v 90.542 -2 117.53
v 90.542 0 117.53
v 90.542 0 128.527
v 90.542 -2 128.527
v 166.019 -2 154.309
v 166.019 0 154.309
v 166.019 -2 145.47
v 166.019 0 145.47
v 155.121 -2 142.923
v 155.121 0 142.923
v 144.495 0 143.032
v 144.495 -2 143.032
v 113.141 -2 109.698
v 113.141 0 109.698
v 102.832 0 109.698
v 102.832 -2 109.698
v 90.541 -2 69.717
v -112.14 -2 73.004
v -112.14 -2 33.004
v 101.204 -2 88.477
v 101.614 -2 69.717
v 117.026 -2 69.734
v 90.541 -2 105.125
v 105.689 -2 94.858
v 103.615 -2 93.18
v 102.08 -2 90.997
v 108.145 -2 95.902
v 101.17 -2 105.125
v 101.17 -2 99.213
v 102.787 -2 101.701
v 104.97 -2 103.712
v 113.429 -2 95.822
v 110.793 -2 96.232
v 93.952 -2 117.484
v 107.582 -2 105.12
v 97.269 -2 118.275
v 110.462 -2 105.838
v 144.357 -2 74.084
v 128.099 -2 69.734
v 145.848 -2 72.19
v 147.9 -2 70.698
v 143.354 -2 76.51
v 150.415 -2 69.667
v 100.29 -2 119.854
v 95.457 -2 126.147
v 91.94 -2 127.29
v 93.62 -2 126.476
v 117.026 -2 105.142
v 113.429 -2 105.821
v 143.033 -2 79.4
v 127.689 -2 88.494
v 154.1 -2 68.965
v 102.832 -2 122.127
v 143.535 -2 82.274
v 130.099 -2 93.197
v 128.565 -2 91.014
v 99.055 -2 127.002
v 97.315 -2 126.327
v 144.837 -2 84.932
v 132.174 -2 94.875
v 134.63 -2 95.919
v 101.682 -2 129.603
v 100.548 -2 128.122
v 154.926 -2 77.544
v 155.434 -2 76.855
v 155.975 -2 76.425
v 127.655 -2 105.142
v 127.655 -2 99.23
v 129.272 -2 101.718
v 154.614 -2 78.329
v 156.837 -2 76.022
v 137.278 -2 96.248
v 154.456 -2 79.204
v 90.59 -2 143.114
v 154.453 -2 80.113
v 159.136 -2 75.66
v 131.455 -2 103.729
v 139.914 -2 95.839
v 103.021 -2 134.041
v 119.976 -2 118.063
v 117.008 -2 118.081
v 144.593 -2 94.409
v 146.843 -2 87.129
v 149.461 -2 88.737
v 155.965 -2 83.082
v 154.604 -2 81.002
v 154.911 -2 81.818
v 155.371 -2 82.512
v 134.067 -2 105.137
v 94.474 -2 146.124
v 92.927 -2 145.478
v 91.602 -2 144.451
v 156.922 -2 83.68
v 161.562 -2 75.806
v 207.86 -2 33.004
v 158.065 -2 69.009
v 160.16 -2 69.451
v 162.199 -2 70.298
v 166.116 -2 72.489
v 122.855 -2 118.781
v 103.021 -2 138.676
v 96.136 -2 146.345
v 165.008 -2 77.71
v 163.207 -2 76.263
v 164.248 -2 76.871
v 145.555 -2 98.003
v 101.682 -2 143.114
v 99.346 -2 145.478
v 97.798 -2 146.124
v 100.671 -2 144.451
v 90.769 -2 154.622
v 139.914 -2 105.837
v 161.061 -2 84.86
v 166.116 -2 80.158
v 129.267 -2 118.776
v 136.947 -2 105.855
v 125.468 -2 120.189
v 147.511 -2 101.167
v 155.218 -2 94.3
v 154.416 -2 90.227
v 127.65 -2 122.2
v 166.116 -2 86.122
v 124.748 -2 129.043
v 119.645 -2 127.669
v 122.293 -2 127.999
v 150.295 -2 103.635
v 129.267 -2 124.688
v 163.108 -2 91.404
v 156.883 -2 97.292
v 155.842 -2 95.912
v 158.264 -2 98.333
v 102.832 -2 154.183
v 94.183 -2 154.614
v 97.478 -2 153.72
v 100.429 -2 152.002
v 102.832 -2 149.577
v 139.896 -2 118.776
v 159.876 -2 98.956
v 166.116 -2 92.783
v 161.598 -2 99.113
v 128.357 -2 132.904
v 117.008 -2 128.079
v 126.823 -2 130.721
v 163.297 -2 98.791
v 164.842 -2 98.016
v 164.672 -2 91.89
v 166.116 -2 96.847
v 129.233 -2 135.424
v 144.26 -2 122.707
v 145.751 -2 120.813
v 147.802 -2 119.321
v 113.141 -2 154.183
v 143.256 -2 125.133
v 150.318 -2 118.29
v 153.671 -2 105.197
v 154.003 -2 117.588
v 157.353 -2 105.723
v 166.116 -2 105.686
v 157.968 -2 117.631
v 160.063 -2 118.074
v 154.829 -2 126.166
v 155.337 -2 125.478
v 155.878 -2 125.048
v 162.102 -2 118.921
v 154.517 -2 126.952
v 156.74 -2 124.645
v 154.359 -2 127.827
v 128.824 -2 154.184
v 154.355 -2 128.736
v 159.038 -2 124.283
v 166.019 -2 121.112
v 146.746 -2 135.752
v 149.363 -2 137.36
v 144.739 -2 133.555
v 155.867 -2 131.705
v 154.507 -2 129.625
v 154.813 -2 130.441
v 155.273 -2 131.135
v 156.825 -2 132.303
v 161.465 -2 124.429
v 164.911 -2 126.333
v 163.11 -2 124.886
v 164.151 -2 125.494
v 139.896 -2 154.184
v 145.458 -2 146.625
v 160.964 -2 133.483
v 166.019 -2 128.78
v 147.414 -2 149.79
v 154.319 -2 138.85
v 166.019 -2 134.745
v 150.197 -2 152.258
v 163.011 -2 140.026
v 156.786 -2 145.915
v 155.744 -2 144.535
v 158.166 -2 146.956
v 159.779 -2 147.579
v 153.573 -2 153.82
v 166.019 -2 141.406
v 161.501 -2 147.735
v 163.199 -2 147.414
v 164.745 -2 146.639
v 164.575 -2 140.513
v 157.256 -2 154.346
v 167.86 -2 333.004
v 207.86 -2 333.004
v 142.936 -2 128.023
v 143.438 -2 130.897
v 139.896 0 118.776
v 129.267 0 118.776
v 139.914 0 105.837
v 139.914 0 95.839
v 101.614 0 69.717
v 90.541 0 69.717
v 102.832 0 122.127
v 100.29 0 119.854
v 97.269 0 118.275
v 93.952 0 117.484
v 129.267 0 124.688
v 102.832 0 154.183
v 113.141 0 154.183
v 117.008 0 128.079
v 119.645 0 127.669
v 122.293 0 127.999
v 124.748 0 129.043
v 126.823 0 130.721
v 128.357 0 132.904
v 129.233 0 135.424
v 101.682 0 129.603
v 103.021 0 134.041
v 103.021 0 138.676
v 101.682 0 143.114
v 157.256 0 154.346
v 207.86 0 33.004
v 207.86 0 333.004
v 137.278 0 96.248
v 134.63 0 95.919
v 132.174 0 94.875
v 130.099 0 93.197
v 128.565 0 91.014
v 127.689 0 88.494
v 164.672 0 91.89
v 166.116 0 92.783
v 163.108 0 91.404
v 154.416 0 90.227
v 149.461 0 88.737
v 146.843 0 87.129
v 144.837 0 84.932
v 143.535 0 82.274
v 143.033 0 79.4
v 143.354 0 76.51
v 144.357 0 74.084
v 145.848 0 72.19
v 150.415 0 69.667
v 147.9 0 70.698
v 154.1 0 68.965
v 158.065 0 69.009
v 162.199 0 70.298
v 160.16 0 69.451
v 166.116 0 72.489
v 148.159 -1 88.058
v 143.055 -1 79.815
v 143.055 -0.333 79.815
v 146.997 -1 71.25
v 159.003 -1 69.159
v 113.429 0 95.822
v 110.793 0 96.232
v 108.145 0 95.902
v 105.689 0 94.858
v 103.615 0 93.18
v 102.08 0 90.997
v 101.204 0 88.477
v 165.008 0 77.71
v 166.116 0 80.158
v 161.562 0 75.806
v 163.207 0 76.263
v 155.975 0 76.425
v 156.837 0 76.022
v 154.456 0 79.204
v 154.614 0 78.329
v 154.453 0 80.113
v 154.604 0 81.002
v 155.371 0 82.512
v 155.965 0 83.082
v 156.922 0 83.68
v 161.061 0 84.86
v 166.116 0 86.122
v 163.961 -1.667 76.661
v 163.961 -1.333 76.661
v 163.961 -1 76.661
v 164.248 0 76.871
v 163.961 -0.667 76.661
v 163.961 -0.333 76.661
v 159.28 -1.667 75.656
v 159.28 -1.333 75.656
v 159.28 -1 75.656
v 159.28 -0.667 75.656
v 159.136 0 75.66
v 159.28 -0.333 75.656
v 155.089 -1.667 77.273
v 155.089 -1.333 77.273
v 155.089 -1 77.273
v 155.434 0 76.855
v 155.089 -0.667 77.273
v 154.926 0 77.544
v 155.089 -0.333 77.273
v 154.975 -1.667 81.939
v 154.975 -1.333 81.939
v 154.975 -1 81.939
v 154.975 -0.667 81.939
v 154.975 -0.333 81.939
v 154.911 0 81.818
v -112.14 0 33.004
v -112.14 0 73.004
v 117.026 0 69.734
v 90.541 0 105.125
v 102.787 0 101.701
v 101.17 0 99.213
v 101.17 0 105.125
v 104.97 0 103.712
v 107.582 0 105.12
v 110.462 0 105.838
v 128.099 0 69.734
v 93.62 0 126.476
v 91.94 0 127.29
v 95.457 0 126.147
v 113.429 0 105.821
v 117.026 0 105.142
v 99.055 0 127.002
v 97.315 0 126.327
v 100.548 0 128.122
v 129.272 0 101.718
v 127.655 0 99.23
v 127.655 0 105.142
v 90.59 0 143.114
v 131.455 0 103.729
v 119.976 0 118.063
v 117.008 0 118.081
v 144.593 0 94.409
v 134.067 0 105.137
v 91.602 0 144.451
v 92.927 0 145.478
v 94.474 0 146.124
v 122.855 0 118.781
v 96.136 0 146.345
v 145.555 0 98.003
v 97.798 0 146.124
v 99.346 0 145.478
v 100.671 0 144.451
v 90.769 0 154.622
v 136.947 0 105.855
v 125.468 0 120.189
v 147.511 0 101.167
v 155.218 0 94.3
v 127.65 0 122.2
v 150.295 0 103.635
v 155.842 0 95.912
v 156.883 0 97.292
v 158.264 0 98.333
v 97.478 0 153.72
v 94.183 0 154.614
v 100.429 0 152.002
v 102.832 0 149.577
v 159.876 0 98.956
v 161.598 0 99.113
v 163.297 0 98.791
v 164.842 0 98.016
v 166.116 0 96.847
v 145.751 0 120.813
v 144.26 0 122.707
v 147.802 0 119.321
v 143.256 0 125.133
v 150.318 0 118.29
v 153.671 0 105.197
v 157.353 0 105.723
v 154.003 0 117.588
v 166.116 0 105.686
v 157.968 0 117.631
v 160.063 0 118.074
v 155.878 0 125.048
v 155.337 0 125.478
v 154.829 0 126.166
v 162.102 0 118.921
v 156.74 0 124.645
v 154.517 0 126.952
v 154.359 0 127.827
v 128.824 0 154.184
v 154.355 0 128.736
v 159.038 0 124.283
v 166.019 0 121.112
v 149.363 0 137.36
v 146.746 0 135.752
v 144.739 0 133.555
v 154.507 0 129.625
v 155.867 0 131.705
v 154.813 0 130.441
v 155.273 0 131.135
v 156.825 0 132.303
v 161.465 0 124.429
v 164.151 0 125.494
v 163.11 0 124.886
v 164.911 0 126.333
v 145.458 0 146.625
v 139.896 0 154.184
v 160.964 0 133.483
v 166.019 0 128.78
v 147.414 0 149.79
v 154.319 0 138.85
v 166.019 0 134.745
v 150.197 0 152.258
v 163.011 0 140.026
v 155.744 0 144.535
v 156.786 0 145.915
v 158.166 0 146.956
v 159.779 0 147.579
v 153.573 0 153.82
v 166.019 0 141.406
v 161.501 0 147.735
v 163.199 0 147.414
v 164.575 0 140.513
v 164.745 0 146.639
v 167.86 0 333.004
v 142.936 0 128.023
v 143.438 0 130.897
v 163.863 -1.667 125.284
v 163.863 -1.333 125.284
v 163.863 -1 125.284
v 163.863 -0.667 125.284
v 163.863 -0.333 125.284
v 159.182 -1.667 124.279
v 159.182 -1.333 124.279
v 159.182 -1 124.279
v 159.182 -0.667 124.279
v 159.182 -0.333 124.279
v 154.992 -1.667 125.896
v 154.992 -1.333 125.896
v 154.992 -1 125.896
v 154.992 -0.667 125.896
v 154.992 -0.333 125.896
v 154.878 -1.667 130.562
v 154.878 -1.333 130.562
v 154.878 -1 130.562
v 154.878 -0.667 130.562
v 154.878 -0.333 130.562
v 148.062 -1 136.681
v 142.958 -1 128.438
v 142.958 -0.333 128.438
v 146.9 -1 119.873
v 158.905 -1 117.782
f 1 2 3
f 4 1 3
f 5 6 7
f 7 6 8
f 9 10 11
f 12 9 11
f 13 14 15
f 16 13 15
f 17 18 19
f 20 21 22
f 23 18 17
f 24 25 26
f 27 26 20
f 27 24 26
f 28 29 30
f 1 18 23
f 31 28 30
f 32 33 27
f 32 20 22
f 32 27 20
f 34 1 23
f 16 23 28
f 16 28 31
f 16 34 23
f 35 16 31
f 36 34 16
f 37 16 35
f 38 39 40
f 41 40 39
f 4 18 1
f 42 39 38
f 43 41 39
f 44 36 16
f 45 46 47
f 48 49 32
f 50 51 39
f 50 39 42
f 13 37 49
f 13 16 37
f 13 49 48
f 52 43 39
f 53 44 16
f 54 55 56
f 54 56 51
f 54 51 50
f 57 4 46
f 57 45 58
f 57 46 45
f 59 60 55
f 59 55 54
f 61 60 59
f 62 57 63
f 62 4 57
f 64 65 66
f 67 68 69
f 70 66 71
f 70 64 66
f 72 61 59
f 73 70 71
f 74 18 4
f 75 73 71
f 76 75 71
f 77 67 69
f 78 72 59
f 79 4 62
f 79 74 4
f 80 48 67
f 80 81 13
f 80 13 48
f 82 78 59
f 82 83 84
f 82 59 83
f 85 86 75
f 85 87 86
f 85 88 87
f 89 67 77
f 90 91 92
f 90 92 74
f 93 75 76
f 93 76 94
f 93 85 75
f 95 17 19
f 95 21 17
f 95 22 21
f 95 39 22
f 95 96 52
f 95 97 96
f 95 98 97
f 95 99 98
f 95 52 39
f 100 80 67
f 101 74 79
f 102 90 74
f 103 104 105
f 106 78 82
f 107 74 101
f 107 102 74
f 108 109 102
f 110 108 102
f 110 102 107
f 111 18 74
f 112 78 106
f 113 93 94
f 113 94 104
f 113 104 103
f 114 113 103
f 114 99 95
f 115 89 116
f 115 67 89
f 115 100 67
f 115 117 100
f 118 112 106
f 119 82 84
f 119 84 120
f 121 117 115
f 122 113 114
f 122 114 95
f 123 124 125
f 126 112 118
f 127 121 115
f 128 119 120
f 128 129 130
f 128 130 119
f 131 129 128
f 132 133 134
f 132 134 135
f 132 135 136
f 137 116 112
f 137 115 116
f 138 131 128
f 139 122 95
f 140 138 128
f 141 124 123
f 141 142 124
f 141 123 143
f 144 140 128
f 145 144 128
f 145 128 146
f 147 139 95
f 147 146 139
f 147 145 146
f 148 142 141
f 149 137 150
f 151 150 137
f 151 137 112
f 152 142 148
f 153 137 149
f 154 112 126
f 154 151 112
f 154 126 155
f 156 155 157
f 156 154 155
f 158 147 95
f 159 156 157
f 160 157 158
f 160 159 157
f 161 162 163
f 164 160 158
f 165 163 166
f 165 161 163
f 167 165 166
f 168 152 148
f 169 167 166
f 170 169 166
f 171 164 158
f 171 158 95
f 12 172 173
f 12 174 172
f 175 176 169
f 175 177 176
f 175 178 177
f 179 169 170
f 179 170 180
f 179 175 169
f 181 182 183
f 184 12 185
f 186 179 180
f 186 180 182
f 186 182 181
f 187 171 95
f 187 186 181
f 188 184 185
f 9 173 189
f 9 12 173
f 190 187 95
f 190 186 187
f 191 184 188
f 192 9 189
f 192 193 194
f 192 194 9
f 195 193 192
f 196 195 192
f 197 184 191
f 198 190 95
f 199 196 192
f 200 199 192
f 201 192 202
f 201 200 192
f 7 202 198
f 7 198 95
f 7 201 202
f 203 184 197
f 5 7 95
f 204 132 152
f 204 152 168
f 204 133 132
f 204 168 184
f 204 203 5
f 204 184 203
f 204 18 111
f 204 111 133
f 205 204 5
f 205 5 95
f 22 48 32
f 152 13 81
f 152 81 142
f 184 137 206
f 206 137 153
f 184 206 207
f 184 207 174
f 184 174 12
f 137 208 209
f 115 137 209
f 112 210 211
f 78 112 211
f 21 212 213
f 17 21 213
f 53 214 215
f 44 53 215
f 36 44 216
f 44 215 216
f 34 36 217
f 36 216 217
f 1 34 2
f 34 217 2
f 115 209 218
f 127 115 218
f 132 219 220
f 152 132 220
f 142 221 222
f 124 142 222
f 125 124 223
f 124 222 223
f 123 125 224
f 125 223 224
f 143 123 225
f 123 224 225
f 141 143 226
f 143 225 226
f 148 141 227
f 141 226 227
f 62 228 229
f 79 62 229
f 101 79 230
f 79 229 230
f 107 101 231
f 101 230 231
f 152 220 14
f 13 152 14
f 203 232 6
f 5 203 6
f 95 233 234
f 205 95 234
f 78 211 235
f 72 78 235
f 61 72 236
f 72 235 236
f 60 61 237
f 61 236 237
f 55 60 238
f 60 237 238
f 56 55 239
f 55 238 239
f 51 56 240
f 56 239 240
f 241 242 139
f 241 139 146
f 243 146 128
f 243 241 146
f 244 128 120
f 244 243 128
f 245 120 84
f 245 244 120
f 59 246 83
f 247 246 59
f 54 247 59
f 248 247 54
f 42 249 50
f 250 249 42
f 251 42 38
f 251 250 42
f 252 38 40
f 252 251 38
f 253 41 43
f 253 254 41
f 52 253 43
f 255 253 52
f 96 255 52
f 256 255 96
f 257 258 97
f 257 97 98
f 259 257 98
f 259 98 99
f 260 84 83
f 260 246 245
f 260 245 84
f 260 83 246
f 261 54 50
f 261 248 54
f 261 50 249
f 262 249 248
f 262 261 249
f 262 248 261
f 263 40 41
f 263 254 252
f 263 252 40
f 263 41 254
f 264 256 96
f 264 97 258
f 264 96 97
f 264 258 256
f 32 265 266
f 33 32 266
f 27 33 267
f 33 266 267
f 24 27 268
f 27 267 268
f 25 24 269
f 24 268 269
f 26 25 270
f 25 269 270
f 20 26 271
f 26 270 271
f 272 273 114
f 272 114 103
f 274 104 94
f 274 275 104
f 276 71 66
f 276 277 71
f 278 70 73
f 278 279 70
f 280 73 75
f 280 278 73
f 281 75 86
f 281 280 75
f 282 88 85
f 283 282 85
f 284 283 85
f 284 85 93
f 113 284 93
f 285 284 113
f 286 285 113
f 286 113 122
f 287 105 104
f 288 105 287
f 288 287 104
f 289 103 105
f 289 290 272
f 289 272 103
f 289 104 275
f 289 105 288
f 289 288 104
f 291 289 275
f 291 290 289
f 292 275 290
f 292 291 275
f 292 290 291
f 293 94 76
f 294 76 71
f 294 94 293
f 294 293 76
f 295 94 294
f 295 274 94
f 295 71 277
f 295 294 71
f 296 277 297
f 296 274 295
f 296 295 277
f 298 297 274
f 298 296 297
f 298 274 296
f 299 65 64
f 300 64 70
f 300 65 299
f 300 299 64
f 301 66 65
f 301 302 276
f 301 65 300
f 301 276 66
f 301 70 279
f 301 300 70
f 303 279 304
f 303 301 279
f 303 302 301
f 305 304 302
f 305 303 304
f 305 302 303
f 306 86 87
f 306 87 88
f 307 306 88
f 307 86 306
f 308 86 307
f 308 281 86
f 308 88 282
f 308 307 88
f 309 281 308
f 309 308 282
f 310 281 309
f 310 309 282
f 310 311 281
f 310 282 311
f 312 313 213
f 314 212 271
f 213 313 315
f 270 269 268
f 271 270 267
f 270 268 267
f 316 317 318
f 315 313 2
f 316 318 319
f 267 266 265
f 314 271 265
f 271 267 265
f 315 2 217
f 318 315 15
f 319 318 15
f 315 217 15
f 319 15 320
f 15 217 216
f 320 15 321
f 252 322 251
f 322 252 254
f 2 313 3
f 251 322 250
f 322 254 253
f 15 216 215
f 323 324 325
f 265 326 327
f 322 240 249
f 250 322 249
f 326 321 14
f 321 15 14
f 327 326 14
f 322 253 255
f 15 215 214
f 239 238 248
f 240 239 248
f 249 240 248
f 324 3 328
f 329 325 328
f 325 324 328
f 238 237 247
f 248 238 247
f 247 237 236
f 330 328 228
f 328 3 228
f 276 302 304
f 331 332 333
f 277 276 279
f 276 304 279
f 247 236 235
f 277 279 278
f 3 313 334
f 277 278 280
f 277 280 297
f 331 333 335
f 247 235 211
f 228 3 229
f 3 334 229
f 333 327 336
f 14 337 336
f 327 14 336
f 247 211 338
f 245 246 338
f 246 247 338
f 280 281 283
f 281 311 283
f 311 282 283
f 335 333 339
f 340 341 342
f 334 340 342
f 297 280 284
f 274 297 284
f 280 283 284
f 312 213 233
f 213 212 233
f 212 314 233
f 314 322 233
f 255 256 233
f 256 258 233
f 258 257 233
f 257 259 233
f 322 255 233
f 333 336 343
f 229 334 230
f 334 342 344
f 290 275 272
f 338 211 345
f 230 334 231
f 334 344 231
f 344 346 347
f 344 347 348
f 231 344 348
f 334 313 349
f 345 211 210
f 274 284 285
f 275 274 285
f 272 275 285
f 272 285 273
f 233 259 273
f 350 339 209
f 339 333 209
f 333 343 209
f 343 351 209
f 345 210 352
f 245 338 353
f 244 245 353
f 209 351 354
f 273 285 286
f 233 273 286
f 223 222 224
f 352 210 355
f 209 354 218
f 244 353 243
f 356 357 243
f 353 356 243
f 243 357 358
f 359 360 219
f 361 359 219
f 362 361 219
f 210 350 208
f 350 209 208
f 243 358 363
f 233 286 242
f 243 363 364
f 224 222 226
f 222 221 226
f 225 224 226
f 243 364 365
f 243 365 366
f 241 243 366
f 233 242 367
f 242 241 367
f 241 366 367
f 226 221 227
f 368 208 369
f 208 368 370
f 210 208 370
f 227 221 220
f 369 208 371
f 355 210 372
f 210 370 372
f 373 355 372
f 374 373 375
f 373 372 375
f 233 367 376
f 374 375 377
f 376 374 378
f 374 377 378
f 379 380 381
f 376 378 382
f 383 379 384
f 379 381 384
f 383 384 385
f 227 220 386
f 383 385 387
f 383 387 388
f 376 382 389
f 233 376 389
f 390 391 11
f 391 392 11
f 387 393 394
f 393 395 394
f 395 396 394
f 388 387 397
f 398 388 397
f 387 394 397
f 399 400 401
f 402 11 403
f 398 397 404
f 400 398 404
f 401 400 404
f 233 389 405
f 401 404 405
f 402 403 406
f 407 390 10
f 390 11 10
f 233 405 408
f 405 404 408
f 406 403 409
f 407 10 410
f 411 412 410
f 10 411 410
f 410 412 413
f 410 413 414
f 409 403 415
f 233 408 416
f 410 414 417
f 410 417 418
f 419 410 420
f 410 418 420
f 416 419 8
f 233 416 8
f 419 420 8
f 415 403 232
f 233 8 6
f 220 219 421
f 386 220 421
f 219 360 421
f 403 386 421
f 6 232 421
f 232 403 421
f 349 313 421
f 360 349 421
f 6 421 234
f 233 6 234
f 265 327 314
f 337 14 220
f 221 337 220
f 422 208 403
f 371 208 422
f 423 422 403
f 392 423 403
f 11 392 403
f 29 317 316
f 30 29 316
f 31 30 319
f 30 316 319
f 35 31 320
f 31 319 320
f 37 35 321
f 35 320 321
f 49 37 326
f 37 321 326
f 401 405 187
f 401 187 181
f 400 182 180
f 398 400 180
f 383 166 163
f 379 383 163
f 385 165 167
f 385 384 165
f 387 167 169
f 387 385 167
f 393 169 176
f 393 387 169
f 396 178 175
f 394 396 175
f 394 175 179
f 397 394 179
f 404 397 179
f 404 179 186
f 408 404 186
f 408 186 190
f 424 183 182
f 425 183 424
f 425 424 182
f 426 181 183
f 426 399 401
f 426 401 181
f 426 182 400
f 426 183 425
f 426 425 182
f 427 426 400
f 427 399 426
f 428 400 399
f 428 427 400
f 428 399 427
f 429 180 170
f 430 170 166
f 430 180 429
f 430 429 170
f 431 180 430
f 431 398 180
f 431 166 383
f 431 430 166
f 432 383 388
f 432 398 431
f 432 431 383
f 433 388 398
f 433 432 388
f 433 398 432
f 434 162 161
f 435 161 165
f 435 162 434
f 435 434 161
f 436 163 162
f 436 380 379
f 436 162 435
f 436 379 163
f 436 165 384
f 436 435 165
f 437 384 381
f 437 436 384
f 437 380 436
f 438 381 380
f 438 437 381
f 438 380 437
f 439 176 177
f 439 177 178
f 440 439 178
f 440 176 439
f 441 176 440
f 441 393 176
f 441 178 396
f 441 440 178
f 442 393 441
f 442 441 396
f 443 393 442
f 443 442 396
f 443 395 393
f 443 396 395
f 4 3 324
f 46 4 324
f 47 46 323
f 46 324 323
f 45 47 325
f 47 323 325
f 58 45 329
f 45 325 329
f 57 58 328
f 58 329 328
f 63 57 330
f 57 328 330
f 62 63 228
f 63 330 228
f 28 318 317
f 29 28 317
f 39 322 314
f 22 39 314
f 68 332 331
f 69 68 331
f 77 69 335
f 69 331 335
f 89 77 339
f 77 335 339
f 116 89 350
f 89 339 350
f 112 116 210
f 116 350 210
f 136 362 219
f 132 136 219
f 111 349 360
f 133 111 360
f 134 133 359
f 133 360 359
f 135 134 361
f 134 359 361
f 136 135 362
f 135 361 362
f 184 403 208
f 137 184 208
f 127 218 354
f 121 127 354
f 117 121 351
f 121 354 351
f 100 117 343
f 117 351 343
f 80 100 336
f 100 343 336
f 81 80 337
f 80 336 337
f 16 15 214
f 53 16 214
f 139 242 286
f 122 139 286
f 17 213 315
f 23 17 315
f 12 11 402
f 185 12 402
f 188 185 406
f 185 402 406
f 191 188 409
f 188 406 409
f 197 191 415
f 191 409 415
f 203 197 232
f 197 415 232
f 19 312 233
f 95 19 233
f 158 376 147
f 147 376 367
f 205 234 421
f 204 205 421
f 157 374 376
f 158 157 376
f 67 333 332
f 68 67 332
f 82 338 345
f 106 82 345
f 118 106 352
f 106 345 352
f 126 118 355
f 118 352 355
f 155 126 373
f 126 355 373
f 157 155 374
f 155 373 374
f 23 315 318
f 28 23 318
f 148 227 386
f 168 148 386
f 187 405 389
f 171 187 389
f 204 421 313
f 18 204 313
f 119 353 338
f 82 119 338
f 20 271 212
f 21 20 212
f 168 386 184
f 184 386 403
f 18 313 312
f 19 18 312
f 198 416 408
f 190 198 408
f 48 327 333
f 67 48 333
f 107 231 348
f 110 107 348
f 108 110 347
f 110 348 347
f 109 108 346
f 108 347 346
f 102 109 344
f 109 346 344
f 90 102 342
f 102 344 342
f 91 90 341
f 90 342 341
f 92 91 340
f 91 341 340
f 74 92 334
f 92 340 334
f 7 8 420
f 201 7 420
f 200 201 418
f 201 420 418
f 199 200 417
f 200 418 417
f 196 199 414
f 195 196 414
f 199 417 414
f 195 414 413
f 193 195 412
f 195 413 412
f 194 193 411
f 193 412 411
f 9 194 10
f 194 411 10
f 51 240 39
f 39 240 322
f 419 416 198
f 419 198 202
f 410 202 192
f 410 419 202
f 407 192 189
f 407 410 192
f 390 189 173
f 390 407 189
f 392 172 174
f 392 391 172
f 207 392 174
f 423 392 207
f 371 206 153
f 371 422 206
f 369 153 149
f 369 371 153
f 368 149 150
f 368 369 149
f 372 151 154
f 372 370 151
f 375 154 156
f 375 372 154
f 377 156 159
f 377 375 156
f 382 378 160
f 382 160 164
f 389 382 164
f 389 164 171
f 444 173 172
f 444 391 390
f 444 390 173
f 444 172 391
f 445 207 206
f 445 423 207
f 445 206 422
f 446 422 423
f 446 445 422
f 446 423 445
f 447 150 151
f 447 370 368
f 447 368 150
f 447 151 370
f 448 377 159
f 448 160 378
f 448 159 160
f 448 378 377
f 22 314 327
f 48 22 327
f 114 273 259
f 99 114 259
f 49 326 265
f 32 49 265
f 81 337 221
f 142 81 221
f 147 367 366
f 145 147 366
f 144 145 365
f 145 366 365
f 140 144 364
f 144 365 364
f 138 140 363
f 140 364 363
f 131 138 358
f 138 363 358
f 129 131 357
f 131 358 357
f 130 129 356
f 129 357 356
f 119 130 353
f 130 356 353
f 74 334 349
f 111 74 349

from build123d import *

# Parameters (mm, degrees)
F1_DEPTH = 2


with BuildPart() as f1:
    # F0 (on Front) → F1 (new body)
    with BuildSketch(Plane.XZ):
        Polygon((-112.1402904391, 33.0038927495), (207.8597095609, 33.0038927495), (207.8597095609, 332.3038927495), (207.8597095609, 333.0038927495), (167.8597095609, 333.0038927495), (-112.1402904391, 73.0038927495), align=None)
        with BuildLine():
            Line((101.2039725726, 88.4770882584), (101.6136759777, 69.7171021446))
            Line((101.6136759777, 69.7171021446), (90.5410552282, 69.7171021446))
            Line((90.5410552282, 69.7171021446), (90.5410552282, 105.1249880537))
            Line((90.5410552282, 105.1249880537), (101.1704111356, 105.1249880537))
            Line((101.1704111356, 105.1249880537), (101.1704111356, 99.2129225477))
            ThreePointArc((101.1704111356, 99.2129225477), (106.2318508757, 104.4981198242), (113.4292611737, 105.8205295548))
            Line((113.4292611737, 105.8205295548), (113.4292611737, 95.8221633181))
            ThreePointArc((113.4292611737, 95.8221633181), (105.6893165245, 94.8581367621), (101.2039725726, 88.4770882584))
        make_face(mode=Mode.SUBTRACT)
        with BuildLine():
            Line((127.6888195951, 88.4937142061), (128.0985230001, 69.7337280923))
            Line((128.0985230001, 69.7337280923), (117.0259022507, 69.7337280923))
            Line((117.0259022507, 69.7337280923), (117.0259022507, 105.1416140014))
            Line((117.0259022507, 105.1416140014), (127.6552581581, 105.1416140014))
            Line((127.6552581581, 105.1416140014), (127.6552581581, 99.2295484954))
            ThreePointArc((127.6552581581, 99.2295484954), (132.7166978981, 104.5147457719), (139.9141081962, 105.8371555025))
            Line((139.9141081962, 105.8371555025), (139.9141081962, 95.8387892658))
            ThreePointArc((139.9141081962, 95.8387892658), (132.1741635469, 94.8747627098), (127.6888195951, 88.4937142061))
        make_face(mode=Mode.SUBTRACT)
        with BuildLine():
            add(Edge.make_bspline(
                [(166.1158787618, 92.7830700848), (164.5692102089, 91.5353198263), (160.8559417387, 91.0074140824), (147.0308134747, 89.8356227603), (141.5287422164, 79.8600298922), (145.6215095019, 69.4638702682), (159.8163332075, 68.0542730887), (163.3323899676, 71.0322612124), (166.1158787618, 72.4894021723)],
                knots=[0, 0, 0, 0, 0.1282549597, 0.3235779421, 0.4933166916, 0.6588260023, 0.8480719548, 1, 1, 1, 1], degree=3))
            Line((166.1158787618, 92.7830700848), (166.1158787618, 86.1217890952))
            add(Edge.make_bspline(
                [(166.1158787618, 80.1576142285), (165.648079511, 78.8716732666), (164.7089985438, 76.1838402752), (159.2900957109, 75.3320101397), (154.3144147308, 76.3842047893), (154.1488989038, 82.6667071186), (159.3286899056, 84.8140545113), (163.2298071329, 85.1164060676), (166.1158787618, 86.1217890952)],
                knots=[0, 0, 0, 0, 0.1467139352, 0.3148344078, 0.4723324727, 0.6349882053, 0.7976765175, 1, 1, 1, 1], degree=3))
            Line((166.1158787618, 80.1576142285), (166.1158787618, 72.4894021723))
        make_face(mode=Mode.SUBTRACT)
        with BuildLine():
            ThreePointArc((144.5925937182, 94.4093083117), (148.8127137387, 102.502604489), (157.3532582577, 105.7228459891))
            Line((157.3532582577, 105.7228459891), (166.1158787618, 105.6858685351))
            Line((166.1158787618, 105.6858685351), (166.1158787618, 96.8470781765))
            ThreePointArc((166.1158787618, 96.8470781765), (159.8763121864, 98.9559091904), (155.2180157191, 94.2997698758))
            Line((155.2180157191, 94.2997698758), (144.5925937182, 94.4093083117))
        make_face(mode=Mode.SUBTRACT)
        with BuildLine():
            ThreePointArc((90.7690819051, 154.6215500374), (97.4783010599, 153.7198410632), (102.8321381356, 149.5770003338))
            Line((102.8321381356, 149.5770003338), (102.8321381356, 154.1828896542))
            Line((102.8321381356, 154.1828896542), (113.140575185, 154.1828896542))
            Line((113.140575185, 154.1828896542), (113.140575185, 109.6980508108))
            Line((113.140575185, 109.6980508108), (102.8321381356, 109.6980508108))
            Line((102.8321381356, 109.6980508108), (102.8321381356, 122.1266548772))
            ThreePointArc((102.8321381356, 122.1266548772), (97.2685141585, 118.2745070428), (90.5424948479, 117.5304513116))
            Line((90.5424948479, 117.5304513116), (90.5424948479, 128.526845171))
            ThreePointArc((90.5424948479, 128.526845171), (96.3918627119, 126.17333299), (101.6822974827, 129.6034093638))
            ThreePointArc((101.6822974827, 129.6034093638), (103.1910724549, 136.3586272736), (101.6822974827, 143.1138451834))
            ThreePointArc((101.6822974827, 143.1138451834), (96.1363497819, 146.3446188485), (90.5904020812, 143.1138451834))
            Line((90.5904020812, 143.1138451834), (90.7690819051, 154.6215500374))
        make_face(mode=Mode.SUBTRACT)
        with BuildLine():
            Line((129.2334676245, 135.4241105345), (128.8237642195, 154.1840966483))
            Line((128.8237642195, 154.1840966483), (139.8963849689, 154.1840966483))
            Line((139.8963849689, 154.1840966483), (139.8963849689, 118.7762107392))
            Line((139.8963849689, 118.7762107392), (129.2670290615, 118.7762107392))
            Line((129.2670290615, 118.7762107392), (129.2670290615, 124.6882762452))
            ThreePointArc((129.2670290615, 124.6882762452), (124.2055893215, 119.4030789686), (117.0081790234, 118.0806692381))
            Line((117.0081790234, 118.0806692381), (117.0081790234, 128.0790354748))
            ThreePointArc((117.0081790234, 128.0790354748), (124.7481236727, 129.0430620307), (129.2334676245, 135.4241105345))
        make_face(mode=Mode.SUBTRACT)
        with BuildLine():
            add(Edge.make_bspline(
                [(166.0185557871, 141.4059485932), (164.4718872342, 140.1581983347), (160.7586187641, 139.6302925908), (146.9334905, 138.4585012686), (141.4314192417, 128.4829084005), (145.5241865272, 118.0867487766), (159.7190102328, 116.6771515971), (163.2350669929, 119.6551397208), (166.0185557871, 121.1122806807)],
                knots=[0, 0, 0, 0, 0.1282549597, 0.3235779421, 0.4933166916, 0.6588260023, 0.8480719548, 1, 1, 1, 1], degree=3))
            Line((166.0185557871, 141.4059485932), (166.0185557871, 134.7446676035))
            add(Edge.make_bspline(
                [(166.0185557871, 128.7804927369), (165.5507565363, 127.4945517749), (164.6116755691, 124.8067187836), (159.1927727362, 123.9548886481), (154.2170917561, 125.0070832977), (154.0515759291, 131.2895856269), (159.231366931, 133.4369330196), (163.1324841582, 133.739284576), (166.0185557871, 134.7446676035)],
                knots=[0, 0, 0, 0, 0.1467139352, 0.3148344078, 0.4723324727, 0.6349882053, 0.7976765175, 1, 1, 1, 1], degree=3))
            Line((166.0185557871, 128.7804927369), (166.0185557871, 121.1122806807))
        make_face(mode=Mode.SUBTRACT)
        with BuildLine():
            ThreePointArc((144.4952707435, 143.0321868201), (148.715390764, 151.1254829974), (157.255935283, 154.3457244975))
            Line((157.255935283, 154.3457244975), (166.0185557871, 154.3087470435))
            Line((166.0185557871, 154.3087470435), (166.0185557871, 145.4699566849))
            ThreePointArc((166.0185557871, 145.4699566849), (159.7789892117, 147.5787876987), (155.1206927444, 142.9226483841))
            Line((155.1206927444, 142.9226483841), (144.4952707435, 143.0321868201))
        make_face(mode=Mode.SUBTRACT)
    extrude(amount=F1_DEPTH)


solid = f1.part
